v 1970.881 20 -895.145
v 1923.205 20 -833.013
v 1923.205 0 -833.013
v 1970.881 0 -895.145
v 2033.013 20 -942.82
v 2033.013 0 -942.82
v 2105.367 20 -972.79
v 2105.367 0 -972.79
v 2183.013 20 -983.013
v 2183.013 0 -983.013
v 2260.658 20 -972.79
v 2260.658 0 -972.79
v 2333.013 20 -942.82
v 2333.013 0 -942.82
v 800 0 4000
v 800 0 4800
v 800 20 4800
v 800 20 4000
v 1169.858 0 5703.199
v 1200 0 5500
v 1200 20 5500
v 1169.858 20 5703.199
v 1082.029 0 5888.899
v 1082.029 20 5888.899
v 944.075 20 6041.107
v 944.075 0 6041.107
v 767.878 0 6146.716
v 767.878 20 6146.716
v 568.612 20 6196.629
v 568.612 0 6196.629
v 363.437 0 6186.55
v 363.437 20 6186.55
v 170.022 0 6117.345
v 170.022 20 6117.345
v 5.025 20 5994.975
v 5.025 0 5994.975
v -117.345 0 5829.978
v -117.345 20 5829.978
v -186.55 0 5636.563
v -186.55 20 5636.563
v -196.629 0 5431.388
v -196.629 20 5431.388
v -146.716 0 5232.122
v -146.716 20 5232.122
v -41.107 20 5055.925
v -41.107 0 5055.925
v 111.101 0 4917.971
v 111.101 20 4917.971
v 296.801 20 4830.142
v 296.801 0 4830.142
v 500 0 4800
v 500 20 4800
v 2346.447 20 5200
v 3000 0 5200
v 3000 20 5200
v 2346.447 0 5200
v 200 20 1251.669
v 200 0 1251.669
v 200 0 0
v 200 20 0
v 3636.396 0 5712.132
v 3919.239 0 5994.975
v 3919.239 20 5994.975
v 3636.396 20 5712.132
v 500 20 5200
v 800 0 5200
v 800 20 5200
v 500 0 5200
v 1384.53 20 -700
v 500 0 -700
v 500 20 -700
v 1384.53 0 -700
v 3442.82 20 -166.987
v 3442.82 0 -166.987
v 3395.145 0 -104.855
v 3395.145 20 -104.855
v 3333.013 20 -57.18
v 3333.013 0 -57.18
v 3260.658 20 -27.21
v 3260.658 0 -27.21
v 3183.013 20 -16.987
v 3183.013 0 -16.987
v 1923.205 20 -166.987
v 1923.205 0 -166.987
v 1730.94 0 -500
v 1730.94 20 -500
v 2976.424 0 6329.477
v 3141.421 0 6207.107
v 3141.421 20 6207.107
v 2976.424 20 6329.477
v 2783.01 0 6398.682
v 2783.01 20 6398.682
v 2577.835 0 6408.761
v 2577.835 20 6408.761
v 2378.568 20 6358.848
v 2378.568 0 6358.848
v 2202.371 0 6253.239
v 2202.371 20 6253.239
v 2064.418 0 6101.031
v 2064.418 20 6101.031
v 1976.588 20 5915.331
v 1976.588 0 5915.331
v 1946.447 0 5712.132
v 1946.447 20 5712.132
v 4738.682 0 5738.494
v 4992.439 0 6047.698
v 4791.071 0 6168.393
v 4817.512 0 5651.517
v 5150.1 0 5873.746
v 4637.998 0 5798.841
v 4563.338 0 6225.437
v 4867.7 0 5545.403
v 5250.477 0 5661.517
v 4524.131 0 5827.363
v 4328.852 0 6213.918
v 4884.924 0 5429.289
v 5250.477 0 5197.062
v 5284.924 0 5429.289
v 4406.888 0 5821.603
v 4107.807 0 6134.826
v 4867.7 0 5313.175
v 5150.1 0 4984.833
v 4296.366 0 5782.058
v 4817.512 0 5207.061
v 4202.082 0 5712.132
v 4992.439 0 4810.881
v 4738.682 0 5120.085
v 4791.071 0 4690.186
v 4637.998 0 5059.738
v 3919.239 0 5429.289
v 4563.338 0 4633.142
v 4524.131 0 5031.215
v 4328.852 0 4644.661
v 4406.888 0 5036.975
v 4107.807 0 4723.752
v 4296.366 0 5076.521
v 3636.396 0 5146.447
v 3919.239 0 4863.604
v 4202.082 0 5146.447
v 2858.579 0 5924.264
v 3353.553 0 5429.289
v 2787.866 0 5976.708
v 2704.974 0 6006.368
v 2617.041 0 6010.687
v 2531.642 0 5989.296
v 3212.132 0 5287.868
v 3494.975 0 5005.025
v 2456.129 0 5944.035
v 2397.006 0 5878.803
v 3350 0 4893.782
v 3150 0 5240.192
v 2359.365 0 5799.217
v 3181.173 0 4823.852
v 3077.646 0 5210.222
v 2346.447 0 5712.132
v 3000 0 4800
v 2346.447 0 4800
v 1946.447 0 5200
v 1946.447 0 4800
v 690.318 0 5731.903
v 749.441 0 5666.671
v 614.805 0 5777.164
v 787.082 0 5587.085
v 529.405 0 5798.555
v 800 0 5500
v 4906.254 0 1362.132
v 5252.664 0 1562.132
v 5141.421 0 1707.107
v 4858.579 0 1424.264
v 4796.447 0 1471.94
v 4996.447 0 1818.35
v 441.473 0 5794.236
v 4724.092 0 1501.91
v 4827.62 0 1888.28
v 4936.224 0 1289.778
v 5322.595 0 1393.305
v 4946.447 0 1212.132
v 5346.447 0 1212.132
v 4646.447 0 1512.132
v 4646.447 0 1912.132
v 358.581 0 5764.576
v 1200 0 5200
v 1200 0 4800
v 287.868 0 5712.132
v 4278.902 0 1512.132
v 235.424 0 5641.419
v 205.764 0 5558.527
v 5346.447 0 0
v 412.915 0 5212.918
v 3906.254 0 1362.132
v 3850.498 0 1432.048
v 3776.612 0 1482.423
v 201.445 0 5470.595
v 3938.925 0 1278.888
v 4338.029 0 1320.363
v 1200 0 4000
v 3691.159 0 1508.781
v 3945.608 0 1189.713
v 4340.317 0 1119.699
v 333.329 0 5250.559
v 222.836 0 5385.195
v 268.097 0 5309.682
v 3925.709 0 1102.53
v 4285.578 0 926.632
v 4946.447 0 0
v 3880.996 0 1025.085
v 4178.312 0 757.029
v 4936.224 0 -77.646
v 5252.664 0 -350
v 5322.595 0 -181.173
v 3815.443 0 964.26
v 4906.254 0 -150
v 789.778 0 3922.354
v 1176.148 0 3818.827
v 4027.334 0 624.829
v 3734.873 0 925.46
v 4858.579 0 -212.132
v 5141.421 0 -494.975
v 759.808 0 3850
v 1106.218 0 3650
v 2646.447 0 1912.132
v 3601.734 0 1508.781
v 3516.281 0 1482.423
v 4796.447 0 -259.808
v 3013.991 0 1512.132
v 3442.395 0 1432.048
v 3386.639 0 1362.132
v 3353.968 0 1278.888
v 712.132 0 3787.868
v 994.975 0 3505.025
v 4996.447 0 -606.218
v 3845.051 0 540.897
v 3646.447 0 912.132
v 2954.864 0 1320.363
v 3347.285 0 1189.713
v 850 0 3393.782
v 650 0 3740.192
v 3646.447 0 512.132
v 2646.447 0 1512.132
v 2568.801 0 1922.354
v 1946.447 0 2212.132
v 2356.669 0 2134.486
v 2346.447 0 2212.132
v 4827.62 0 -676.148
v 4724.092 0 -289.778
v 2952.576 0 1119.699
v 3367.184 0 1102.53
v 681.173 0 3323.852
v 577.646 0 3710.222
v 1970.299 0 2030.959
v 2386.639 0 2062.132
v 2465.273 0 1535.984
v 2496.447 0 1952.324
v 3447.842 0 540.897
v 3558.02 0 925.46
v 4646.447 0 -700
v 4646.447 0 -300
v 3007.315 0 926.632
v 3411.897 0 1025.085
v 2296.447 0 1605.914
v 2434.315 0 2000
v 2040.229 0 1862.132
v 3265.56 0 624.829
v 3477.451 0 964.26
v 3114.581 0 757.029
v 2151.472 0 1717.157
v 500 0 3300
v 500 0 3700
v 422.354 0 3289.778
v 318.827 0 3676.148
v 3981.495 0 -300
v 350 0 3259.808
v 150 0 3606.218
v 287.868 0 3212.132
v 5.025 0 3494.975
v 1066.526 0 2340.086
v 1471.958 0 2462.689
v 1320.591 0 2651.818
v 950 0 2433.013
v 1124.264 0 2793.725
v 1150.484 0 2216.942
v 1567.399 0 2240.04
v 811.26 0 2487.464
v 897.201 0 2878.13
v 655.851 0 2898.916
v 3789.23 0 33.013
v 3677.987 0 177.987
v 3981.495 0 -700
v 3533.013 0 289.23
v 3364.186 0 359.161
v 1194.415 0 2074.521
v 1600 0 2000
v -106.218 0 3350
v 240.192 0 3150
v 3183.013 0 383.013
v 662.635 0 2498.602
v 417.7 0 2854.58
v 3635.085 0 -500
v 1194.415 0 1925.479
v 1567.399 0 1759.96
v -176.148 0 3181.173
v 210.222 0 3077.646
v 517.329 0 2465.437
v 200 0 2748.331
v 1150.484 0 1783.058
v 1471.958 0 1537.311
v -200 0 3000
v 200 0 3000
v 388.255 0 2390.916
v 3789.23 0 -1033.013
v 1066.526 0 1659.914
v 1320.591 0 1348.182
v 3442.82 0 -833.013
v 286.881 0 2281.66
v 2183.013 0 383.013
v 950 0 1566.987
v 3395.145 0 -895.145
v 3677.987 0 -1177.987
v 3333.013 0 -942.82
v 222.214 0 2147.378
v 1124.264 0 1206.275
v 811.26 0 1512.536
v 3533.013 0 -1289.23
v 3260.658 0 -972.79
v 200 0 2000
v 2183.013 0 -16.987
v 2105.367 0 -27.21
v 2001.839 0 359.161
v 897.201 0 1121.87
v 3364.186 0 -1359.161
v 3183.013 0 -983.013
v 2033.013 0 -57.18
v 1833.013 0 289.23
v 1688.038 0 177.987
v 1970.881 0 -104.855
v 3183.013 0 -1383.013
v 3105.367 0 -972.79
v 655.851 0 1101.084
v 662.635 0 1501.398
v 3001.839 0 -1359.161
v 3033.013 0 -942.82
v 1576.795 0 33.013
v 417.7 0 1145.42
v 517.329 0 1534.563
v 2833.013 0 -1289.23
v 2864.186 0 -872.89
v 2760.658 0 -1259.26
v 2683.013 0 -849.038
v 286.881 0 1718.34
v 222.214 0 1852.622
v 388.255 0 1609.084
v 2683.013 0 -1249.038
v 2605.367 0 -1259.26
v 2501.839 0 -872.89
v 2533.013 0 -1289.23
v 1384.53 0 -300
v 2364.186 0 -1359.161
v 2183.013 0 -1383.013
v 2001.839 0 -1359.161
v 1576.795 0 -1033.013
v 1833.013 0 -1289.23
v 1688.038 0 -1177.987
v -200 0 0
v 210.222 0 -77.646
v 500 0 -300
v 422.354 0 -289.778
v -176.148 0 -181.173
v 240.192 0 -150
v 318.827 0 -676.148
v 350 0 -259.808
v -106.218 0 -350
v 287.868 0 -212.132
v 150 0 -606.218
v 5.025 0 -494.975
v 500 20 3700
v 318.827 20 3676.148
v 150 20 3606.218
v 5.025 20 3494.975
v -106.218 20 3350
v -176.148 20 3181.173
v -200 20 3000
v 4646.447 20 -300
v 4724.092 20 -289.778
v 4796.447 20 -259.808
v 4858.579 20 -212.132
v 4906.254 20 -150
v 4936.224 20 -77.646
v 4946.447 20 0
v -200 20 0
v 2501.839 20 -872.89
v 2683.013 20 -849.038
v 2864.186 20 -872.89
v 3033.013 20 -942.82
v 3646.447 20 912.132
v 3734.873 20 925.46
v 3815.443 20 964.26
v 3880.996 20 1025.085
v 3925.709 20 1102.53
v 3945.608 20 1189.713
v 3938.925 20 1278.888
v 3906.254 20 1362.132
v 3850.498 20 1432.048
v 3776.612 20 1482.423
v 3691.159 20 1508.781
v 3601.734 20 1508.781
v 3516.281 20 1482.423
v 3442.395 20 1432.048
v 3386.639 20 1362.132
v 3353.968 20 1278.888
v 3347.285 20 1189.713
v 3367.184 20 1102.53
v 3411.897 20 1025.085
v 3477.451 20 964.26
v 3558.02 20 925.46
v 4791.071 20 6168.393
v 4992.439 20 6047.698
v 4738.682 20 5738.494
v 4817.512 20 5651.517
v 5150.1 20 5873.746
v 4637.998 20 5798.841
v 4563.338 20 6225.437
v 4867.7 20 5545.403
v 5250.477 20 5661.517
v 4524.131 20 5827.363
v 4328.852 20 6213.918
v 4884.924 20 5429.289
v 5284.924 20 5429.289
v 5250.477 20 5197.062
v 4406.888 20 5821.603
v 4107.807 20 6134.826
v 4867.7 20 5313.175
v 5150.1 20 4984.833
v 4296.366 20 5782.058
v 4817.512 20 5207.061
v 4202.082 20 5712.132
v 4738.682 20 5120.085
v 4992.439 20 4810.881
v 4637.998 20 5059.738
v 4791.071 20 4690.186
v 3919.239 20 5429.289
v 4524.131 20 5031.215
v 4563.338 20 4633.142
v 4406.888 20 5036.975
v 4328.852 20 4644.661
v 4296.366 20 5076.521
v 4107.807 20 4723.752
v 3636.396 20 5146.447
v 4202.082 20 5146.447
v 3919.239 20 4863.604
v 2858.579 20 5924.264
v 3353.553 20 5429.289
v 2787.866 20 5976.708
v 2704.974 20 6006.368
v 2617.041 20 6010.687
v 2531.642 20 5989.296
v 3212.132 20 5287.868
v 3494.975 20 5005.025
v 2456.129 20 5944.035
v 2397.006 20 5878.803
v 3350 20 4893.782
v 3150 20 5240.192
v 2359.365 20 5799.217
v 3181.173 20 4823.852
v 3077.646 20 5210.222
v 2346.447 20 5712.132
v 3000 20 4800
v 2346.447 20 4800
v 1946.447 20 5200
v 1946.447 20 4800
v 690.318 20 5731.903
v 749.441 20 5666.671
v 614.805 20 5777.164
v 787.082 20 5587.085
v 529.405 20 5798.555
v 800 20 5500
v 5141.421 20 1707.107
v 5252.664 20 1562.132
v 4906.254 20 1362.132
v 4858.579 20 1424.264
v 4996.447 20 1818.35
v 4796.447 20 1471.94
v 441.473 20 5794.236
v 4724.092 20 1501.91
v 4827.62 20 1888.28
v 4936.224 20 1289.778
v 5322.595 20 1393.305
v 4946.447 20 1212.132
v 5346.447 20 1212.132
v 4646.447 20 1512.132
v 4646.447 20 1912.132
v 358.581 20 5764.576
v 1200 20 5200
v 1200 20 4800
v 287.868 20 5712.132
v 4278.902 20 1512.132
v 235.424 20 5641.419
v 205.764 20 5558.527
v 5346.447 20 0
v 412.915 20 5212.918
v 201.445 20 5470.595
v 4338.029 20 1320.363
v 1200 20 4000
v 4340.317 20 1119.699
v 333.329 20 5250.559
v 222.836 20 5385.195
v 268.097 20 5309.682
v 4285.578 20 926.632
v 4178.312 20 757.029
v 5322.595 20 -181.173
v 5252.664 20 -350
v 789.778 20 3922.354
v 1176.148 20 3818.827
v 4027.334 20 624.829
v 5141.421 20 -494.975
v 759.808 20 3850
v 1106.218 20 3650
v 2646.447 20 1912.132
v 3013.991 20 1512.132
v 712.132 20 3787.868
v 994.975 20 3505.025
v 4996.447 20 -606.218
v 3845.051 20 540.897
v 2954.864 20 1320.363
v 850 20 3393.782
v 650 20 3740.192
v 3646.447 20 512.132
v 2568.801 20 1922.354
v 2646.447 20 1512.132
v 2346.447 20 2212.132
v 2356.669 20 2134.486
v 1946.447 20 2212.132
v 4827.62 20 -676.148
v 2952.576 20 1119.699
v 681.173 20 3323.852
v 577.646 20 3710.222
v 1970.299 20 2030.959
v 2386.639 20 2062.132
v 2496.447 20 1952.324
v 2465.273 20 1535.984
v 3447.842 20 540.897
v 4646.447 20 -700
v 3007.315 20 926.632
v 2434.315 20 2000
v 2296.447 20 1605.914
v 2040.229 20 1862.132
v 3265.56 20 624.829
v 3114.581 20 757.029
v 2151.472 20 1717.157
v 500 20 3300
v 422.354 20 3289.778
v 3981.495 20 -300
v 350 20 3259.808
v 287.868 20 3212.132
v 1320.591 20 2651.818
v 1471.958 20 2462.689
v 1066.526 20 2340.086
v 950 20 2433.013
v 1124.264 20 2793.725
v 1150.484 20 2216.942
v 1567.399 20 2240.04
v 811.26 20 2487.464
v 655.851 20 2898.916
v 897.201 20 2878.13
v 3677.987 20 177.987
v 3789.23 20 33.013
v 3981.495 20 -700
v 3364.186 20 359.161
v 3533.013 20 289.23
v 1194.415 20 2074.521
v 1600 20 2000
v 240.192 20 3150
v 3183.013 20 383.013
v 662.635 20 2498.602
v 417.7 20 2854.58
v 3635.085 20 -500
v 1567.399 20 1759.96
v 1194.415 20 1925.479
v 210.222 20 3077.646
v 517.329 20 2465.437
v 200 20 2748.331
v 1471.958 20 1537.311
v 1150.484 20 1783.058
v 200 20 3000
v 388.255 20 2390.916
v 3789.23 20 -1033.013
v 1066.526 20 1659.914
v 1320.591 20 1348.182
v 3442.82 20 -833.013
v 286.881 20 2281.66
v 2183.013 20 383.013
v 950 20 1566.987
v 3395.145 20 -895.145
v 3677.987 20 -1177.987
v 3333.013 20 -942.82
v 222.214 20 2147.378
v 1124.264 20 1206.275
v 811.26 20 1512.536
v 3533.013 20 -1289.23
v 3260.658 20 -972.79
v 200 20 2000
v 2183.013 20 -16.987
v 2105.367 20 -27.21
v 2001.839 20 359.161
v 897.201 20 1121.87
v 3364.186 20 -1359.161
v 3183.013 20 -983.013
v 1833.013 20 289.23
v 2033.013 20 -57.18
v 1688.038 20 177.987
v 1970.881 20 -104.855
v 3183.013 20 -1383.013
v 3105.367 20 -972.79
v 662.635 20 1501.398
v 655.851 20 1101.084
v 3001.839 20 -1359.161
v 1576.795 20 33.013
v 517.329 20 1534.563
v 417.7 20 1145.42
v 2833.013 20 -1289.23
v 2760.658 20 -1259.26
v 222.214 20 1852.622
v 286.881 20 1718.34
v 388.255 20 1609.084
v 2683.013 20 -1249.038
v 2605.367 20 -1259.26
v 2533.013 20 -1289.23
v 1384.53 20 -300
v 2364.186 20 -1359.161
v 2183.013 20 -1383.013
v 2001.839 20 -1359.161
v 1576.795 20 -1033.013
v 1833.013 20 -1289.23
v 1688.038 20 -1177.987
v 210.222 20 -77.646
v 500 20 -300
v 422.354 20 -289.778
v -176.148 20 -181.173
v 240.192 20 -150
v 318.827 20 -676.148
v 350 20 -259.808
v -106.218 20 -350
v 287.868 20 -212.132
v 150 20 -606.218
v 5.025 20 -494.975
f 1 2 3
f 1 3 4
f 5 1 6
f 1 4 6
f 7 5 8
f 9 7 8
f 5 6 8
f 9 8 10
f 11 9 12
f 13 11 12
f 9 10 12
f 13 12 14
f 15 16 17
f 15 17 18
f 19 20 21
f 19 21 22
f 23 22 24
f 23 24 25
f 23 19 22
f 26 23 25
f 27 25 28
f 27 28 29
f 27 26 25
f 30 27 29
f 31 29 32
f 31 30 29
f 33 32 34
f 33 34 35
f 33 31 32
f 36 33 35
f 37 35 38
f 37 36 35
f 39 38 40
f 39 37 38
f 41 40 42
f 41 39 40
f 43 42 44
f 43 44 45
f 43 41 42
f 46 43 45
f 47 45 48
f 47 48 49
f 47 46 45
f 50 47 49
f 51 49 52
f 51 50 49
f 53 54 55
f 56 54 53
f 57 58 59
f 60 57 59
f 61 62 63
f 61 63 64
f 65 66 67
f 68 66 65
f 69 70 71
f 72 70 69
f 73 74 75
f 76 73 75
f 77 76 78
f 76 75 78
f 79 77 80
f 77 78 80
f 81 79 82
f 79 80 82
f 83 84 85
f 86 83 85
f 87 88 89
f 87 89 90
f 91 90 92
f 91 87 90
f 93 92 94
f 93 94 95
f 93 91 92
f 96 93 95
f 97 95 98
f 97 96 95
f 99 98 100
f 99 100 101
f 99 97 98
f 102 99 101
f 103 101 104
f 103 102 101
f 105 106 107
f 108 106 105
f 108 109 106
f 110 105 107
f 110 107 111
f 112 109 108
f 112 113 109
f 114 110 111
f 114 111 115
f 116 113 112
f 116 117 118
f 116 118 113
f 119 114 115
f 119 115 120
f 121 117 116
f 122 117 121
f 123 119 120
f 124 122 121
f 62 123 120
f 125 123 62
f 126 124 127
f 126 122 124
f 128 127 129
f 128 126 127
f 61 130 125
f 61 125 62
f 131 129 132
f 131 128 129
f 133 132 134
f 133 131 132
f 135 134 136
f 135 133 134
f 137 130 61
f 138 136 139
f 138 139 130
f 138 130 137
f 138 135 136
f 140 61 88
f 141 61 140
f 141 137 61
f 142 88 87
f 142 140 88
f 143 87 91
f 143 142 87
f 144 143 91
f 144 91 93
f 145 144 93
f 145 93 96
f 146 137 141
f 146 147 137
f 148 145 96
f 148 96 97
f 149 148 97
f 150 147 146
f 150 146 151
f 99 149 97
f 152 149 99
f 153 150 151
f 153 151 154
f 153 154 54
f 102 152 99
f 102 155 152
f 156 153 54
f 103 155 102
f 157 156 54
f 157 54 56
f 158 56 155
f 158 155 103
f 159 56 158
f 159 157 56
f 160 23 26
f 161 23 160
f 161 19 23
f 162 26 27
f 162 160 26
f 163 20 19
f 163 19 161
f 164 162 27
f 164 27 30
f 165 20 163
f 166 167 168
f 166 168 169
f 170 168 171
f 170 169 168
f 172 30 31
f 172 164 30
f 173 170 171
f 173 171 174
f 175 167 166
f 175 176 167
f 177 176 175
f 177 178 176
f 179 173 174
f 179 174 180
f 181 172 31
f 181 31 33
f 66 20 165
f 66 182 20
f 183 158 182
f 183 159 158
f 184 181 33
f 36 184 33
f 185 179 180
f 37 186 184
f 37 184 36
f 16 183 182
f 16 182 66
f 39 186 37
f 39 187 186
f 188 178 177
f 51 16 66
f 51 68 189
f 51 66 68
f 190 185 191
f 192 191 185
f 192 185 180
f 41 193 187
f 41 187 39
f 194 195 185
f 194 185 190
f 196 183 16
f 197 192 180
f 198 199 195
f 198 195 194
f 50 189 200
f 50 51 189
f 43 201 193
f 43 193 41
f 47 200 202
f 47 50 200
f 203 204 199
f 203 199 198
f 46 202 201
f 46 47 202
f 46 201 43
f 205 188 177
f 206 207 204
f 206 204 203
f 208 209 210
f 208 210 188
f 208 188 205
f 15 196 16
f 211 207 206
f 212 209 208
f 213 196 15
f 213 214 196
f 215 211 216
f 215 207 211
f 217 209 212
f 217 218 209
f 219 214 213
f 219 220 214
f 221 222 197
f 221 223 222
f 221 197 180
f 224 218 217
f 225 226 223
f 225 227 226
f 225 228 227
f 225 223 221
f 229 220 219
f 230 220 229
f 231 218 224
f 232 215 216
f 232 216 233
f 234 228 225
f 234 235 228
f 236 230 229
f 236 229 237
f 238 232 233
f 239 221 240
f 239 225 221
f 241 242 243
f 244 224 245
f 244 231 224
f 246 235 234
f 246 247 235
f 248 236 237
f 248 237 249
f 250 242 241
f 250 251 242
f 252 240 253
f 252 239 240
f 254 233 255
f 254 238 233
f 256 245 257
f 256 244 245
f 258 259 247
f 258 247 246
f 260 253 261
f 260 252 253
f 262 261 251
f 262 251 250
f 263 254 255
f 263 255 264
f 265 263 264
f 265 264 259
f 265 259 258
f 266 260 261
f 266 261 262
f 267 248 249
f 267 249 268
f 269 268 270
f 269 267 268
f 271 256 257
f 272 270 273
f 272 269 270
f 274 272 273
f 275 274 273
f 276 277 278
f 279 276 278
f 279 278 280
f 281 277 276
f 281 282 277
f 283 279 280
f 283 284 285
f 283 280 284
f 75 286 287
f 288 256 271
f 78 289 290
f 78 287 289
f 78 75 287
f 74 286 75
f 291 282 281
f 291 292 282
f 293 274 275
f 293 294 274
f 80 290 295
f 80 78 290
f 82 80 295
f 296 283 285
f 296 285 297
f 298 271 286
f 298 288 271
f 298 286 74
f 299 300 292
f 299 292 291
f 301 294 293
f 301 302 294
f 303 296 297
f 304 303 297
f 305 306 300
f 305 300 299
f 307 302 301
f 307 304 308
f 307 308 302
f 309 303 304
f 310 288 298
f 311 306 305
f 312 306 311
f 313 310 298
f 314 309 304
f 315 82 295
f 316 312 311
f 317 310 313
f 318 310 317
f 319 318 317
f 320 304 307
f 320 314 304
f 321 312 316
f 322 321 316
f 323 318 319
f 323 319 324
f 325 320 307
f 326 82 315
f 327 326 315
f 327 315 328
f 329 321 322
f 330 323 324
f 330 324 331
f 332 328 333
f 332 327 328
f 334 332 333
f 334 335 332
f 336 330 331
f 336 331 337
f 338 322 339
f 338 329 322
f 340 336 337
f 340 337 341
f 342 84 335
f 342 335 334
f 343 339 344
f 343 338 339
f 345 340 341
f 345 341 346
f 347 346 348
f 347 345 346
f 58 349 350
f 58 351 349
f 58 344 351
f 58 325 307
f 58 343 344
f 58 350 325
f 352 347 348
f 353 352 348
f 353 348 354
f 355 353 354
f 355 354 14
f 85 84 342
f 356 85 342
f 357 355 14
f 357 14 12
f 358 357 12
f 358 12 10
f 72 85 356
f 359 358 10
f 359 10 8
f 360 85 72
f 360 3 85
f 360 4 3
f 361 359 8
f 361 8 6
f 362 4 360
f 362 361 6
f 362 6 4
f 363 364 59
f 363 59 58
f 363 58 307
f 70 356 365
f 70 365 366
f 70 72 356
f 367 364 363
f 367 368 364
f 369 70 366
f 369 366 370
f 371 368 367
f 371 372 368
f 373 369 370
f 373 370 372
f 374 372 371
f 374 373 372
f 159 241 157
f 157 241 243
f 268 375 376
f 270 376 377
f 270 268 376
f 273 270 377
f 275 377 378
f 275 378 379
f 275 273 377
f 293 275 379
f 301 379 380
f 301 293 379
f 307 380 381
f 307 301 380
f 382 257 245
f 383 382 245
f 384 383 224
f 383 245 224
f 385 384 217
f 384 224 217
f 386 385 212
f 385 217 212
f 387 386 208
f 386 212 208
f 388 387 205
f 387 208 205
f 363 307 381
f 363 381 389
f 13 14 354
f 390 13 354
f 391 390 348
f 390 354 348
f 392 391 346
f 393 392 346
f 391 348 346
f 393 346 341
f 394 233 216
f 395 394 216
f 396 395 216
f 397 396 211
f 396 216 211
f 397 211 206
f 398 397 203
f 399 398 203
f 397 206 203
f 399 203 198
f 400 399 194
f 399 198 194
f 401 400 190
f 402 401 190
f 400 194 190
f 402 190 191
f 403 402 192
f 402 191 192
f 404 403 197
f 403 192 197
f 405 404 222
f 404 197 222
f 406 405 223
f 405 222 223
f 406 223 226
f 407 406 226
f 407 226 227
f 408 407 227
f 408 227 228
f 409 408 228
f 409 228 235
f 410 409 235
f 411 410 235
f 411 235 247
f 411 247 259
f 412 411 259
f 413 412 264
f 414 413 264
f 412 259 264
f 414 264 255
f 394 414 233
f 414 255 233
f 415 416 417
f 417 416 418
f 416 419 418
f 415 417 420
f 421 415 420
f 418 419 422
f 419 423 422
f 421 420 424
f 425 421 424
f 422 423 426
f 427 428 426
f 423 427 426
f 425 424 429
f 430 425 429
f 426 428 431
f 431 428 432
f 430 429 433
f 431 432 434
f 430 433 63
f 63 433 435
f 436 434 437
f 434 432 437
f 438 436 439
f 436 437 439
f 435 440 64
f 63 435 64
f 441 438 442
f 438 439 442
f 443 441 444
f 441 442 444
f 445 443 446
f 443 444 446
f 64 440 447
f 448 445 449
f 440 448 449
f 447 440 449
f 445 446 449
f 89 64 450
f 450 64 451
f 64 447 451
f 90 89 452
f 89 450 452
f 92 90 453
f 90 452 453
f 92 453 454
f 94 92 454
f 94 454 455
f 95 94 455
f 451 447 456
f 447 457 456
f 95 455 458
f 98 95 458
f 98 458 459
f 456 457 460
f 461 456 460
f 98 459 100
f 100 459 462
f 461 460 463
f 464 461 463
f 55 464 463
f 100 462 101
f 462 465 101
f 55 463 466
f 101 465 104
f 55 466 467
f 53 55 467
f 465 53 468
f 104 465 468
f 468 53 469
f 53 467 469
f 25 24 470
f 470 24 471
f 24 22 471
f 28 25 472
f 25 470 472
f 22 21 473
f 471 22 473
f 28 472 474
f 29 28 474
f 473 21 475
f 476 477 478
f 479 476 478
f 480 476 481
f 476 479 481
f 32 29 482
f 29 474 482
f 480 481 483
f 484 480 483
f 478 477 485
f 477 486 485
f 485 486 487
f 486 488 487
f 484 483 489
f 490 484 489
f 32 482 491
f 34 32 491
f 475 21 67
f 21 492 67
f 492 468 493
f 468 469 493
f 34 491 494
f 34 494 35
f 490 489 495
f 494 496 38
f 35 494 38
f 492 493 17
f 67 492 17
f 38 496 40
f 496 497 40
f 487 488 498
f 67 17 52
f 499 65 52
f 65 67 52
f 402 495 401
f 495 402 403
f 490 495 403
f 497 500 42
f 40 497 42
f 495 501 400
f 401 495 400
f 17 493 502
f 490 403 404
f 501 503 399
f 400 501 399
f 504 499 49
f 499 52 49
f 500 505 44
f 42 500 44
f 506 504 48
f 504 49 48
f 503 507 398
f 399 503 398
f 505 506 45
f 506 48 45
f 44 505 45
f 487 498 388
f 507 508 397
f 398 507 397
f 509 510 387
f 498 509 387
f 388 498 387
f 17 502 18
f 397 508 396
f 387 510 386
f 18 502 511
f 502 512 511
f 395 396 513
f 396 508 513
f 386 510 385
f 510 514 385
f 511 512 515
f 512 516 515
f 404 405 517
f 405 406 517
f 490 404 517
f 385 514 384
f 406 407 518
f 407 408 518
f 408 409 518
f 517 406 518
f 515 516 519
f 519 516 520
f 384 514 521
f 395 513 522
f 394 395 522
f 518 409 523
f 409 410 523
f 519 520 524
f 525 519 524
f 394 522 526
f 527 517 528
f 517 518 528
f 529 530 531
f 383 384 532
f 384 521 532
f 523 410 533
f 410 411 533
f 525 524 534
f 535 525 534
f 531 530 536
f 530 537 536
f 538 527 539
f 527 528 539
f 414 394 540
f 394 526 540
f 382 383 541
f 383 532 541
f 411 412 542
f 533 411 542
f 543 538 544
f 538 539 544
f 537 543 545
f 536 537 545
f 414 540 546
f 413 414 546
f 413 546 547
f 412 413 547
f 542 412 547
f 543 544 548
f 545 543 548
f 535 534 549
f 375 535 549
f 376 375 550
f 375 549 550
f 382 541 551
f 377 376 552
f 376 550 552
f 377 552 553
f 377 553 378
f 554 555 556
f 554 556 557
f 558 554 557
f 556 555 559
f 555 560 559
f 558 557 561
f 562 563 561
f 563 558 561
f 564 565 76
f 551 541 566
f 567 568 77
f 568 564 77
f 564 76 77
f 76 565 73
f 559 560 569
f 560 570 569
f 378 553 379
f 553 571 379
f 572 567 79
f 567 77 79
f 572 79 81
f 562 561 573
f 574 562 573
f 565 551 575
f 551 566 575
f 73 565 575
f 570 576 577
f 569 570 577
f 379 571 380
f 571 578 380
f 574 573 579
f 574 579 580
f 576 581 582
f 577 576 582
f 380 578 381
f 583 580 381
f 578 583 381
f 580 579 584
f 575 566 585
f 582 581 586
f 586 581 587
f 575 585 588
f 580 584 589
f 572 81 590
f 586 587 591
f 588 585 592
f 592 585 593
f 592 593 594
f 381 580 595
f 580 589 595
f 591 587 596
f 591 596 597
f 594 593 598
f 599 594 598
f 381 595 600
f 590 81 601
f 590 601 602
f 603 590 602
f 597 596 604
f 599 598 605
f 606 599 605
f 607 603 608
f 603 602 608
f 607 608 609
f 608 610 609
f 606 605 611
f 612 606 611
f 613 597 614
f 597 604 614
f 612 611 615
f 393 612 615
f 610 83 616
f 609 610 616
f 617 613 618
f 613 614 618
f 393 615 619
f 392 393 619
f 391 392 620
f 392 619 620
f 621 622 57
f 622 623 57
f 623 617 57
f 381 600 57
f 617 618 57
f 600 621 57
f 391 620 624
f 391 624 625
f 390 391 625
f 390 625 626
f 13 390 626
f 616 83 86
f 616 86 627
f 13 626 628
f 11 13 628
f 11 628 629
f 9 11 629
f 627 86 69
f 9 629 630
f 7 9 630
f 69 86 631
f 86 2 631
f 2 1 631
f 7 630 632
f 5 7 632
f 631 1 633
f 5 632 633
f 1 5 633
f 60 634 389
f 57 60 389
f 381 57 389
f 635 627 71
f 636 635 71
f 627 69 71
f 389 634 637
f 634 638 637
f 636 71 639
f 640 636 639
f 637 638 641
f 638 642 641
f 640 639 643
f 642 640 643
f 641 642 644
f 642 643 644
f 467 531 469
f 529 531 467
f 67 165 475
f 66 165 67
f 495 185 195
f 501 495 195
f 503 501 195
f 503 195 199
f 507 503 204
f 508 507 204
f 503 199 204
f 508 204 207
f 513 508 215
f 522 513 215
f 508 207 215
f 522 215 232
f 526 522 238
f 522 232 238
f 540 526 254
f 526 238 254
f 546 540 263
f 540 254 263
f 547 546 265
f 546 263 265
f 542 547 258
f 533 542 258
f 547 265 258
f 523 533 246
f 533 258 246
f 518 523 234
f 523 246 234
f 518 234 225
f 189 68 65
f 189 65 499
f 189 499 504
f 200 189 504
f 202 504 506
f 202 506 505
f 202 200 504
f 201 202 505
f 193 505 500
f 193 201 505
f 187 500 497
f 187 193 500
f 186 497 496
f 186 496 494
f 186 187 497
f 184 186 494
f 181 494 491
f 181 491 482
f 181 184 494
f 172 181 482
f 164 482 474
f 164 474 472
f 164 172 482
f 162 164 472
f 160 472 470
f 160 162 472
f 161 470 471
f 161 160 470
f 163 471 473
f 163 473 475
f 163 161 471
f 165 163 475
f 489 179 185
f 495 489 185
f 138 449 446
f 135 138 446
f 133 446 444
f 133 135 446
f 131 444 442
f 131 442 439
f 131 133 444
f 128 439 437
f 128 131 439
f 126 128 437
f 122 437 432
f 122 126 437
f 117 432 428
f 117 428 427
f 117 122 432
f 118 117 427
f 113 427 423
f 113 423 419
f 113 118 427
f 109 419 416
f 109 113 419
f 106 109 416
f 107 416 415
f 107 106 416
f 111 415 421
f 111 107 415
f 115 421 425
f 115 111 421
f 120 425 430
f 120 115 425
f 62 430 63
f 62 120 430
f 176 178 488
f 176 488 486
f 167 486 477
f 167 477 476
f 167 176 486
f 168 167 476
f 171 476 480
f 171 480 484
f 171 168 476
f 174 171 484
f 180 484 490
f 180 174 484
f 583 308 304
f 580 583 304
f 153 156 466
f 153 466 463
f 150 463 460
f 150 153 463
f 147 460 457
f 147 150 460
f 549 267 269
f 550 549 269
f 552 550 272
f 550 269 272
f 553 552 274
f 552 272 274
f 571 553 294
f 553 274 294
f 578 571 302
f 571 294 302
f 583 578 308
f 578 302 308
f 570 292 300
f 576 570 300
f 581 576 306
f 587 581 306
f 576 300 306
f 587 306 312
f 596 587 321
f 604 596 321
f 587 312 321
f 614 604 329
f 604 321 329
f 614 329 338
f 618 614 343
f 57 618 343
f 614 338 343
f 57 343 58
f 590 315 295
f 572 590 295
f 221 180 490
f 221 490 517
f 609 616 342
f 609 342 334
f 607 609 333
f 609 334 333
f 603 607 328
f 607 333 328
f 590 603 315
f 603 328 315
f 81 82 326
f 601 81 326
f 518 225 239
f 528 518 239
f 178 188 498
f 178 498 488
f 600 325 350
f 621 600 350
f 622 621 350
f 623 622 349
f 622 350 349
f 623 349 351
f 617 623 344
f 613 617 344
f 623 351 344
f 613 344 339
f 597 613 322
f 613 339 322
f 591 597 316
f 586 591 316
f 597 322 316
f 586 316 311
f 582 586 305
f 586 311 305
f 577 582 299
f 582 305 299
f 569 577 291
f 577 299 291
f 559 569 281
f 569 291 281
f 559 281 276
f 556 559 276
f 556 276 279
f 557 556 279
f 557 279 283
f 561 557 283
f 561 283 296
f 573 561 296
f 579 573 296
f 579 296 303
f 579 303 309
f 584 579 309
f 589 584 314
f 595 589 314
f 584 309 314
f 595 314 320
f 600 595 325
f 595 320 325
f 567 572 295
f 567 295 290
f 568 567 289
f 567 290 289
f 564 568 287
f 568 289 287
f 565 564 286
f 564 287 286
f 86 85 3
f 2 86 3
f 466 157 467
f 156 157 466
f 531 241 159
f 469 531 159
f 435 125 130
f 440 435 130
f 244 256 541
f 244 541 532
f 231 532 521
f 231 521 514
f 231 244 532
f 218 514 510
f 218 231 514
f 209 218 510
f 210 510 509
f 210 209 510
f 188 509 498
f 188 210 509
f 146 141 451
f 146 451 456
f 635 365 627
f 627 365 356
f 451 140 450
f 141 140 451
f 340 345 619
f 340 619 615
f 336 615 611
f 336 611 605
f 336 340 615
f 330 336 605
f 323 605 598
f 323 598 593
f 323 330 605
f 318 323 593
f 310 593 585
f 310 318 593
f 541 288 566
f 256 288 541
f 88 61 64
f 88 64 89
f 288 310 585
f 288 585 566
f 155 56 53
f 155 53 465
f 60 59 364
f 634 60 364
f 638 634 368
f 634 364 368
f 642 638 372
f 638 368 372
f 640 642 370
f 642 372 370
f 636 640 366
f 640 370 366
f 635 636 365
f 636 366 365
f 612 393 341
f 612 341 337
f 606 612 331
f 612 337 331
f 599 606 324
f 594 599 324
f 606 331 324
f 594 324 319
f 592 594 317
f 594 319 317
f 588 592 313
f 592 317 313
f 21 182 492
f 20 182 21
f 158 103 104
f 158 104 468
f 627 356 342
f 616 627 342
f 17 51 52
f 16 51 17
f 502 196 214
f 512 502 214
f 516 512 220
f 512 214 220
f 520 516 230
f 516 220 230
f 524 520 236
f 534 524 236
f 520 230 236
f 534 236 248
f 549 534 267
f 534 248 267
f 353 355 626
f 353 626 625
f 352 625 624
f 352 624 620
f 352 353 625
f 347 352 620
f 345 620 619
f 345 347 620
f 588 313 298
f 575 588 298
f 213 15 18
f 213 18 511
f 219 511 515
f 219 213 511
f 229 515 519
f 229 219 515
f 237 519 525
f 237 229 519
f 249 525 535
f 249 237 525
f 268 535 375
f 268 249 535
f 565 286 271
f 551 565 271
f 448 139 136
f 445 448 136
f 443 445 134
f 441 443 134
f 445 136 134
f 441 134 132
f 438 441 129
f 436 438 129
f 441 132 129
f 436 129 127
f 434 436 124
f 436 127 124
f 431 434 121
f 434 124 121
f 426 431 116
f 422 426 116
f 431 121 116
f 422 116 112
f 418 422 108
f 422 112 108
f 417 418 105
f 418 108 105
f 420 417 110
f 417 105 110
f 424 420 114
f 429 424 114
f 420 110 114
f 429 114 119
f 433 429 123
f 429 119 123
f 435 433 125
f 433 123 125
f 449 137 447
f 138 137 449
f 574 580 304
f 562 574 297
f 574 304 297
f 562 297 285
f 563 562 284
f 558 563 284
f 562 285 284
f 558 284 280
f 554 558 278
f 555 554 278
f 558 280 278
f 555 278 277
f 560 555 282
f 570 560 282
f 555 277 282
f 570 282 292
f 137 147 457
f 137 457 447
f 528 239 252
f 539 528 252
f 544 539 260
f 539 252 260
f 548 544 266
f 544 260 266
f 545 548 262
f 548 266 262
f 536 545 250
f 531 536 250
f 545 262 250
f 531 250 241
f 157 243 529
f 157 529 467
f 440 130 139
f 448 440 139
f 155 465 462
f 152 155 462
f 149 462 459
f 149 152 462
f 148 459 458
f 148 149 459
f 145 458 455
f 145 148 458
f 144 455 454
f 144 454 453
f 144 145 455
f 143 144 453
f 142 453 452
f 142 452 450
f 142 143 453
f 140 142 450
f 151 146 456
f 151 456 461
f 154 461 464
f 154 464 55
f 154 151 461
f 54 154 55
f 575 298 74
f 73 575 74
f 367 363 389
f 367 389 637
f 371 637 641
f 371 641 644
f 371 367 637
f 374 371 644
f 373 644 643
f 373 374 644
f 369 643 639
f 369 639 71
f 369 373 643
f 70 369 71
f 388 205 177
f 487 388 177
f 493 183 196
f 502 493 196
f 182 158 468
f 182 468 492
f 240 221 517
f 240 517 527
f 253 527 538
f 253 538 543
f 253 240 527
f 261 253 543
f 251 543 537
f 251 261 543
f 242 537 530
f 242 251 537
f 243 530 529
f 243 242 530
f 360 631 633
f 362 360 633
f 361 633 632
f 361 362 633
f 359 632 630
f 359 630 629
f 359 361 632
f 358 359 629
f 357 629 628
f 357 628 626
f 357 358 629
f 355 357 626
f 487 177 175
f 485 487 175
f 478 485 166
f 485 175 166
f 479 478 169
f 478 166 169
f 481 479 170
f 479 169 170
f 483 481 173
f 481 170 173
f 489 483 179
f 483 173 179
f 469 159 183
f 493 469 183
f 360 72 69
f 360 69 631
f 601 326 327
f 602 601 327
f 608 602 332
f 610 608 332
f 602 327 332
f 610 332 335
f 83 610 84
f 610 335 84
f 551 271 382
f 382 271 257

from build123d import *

# Parameters (mm, degrees)
EXTRUDE_1_DEPTH = 20


with BuildPart() as part:
    # 草图1 → 凸台-拉伸1 (new body)
    with BuildSketch(Plane(origin=(0, 0, 0), x_dir=(1, 0, 0), z_dir=(0, 1, 0))):
        with BuildLine():
            Line((500, 700), (1384.529946162, 700))
            Line((1384.529946162, 700), (1576.794919243, 1033.012701892))
            ThreePointArc((1576.794919243, 1033.012701892), (2001.83937032, 1359.160780295), (2533.012701892, 1289.230484541))
            ThreePointArc((2533.012701892, 1289.230484541), (2683.012701892, 1249.038105677), (2833.012701892, 1289.230484541))
            ThreePointArc((2833.012701892, 1289.230484541), (3364.186033464, 1359.160780295), (3789.230484541, 1033.012701892))
            Line((3789.230484541, 1033.012701892), (3981.495457623, 700))
            Line((3981.495457623, 700), (4646.446609407, 700))
            ThreePointArc((4646.446609407, 700), (5141.421356237, 494.974746831), (5346.446609407, 0))
            Line((5346.446609407, 0), (5346.446609407, -1212.132034356))
            ThreePointArc((5346.446609407, -1212.132034356), (5141.421356237, -1707.106781187), (4646.446609407, -1912.132034356))
            Line((4646.446609407, -1912.132034356), (3646.446609407, -1912.132034356))
            Line((3646.446609407, -1912.132034356), (2646.446609407, -1912.132034356))
            ThreePointArc((2646.446609407, -1912.132034356), (2434.314575051, -2000), (2346.446609407, -2212.132034356))
            Line((2346.446609407, -2212.132034356), (2346.446609407, -4800))
            Line((2346.446609407, -4800), (3000, -4800))
            ThreePointArc((3000, -4800), (3267.878402656, -4853.284327242), (3494.974746831, -5005.025253169))
            Line((3494.974746831, -5005.025253169), (3636.396103068, -5146.446609407))
            Line((3636.396103068, -5146.446609407), (3919.238815543, -4863.603896932))
            ThreePointArc((3919.238815543, -4863.603896932), (5284.924240492, -5429.289321881), (3919.238815543, -5994.974746831))
            Line((3919.238815543, -5994.974746831), (3636.396103068, -5712.132034356))
            Line((3636.396103068, -5712.132034356), (3141.421356237, -6207.106781187))
            ThreePointArc((3141.421356237, -6207.106781187), (2378.568206751, -6358.847707114), (1946.446609407, -5712.132034356))
            Line((1946.446609407, -5712.132034356), (1946.446609407, -5200))
            Line((1946.446609407, -5200), (1200, -5200))
            Line((1200, -5200), (1200, -5500))
            ThreePointArc((1200, -5500), (5.025253169, -5994.974746831), (500, -4800))
            Line((500, -4800), (800, -4800))
            Line((800, -4800), (800, -4000))
            ThreePointArc((800, -4000), (712.132034356, -3787.867965644), (500, -3700))
            ThreePointArc((500, -3700), (5.025253169, -3494.974746831), (-200, -3000))
            Line((-200, -3000), (-200, -2000))
            Line((-200, -2000), (-200, 0))
            ThreePointArc((-200, 0), (5.025253169, 494.974746831), (500, 700))
        make_face()
        with BuildLine():
            Line((1730.940107676, 500), (1923.205080757, 833.012701892))
            ThreePointArc((1923.205080757, 833.012701892), (2105.366988361, 972.790449779), (2333.012701892, 942.820323028))
            ThreePointArc((2333.012701892, 942.820323028), (2683.012701892, 849.038105677), (3033.012701892, 942.820323028))
            ThreePointArc((3033.012701892, 942.820323028), (3260.658415423, 972.790449779), (3442.820323028, 833.012701892))
            Line((3442.820323028, 833.012701892), (3635.085296109, 500))
            Line((3635.085296109, 500), (3442.820323028, 166.987298108))
            ThreePointArc((3442.820323028, 166.987298108), (3333.012701893, 57.179676972), (3183.012701893, 16.987298108))
            Line((3183.012701893, 16.987298108), (2183.012701892, 16.987298108))
            ThreePointArc((2183.012701892, 16.987298108), (2033.012701892, 57.179676972), (1923.205080757, 166.987298108))
            Line((1923.205080757, 166.987298108), (1730.940107676, 500))
        make_face(mode=Mode.SUBTRACT)
        with BuildLine():
            Line((1384.529946162, 300), (1576.794919243, -33.012701892))
            ThreePointArc((1576.794919243, -33.012701892), (1833.012701892, -289.230484541), (2183.012701892, -383.012701892))
            Line((2183.012701892, -383.012701892), (3183.012701893, -383.012701892))
            ThreePointArc((3183.012701893, -383.012701892), (3533.012701893, -289.230484541), (3789.230484542, -33.012701892))
            Line((3789.230484542, -33.012701892), (3981.495457623, 300))
            Line((3981.495457623, 300), (4646.446609407, 300))
            ThreePointArc((4646.446609407, 300), (4858.578643763, 212.132034356), (4946.446609407, 0))
            Line((4946.446609407, 0), (4946.446609407, -1212.132034356))
            ThreePointArc((4946.446609407, -1212.132034356), (4858.578643763, -1424.264068712), (4646.446609407, -1512.132034356))
            Line((4646.446609407, -1512.132034356), (4278.90214144, -1512.132034356))
            ThreePointArc((4278.90214144, -1512.132034356), (4238.054587717, -837.966295679), (3646.446609407, -512.132034356))
            ThreePointArc((3646.446609407, -512.132034356), (3054.838631097, -837.966295679), (3013.991077373, -1512.132034356))
            Line((3013.991077373, -1512.132034356), (2646.446609407, -1512.132034356))
            ThreePointArc((2646.446609407, -1512.132034356), (2151.471862576, -1717.157287525), (1946.446609407, -2212.132034356))
            Line((1946.446609407, -2212.132034356), (1946.446609407, -4800))
            Line((1946.446609407, -4800), (1200, -4800))
            Line((1200, -4800), (1200, -4000))
            ThreePointArc((1200, -4000), (994.974746831, -3505.025253169), (500, -3300))
            ThreePointArc((500, -3300), (287.867965644, -3212.132034356), (200, -3000))
            Line((200, -3000), (200, -2748.331477355))
            ThreePointArc((200, -2748.331477355), (1124.264068712, -2793.725393319), (1600, -2000))
            ThreePointArc((1600, -2000), (1124.264068712, -1206.274606681), (200, -1251.668522645))
            Line((200, -1251.668522645), (200, 0))
            ThreePointArc((200, 0), (287.867965644, 212.132034356), (500, 300))
            Line((500, 300), (1384.529946162, 300))
        make_face(mode=Mode.SUBTRACT)
        with BuildLine():
            Line((2858.578643763, -5924.264068712), (3353.553390593, -5429.289321881))
            Line((3353.553390593, -5429.289321881), (3212.132034356, -5287.867965644))
            ThreePointArc((3212.132034356, -5287.867965644), (3114.80502971, -5222.836140247), (3000, -5200))
            Line((3000, -5200), (2346.446609407, -5200))
            Line((2346.446609407, -5200), (2346.446609407, -5712.132034356))
            ThreePointArc((2346.446609407, -5712.132034356), (2531.641579697, -5989.295894109), (2858.578643763, -5924.264068712))
        make_face(mode=Mode.SUBTRACT)
        with BuildLine():
            Line((4202.081528017, -5712.132034356), (3919.238815543, -5429.289321881))
            Line((3919.238815543, -5429.289321881), (4202.081528017, -5146.446609407))
            ThreePointArc((4202.081528017, -5146.446609407), (4884.924240492, -5429.289321881), (4202.081528017, -5712.132034356))
        make_face(mode=Mode.SUBTRACT)
        with BuildLine():
            Line((800, -5500), (800, -5200))
            Line((800, -5200), (500, -5200))
            ThreePointArc((500, -5200), (287.867965644, -5712.132034356), (800, -5500))
        make_face(mode=Mode.SUBTRACT)
        with BuildLine():
            ThreePointArc((3646.446609407, -1512.132034356), (3346.446609407, -1212.132034356), (3646.446609407, -912.132034356))
            ThreePointArc((3646.446609407, -912.132034356), (3946.446609407, -1212.132034356), (3646.446609407, -1512.132034356))
        make_face(mode=Mode.SUBTRACT)
        with BuildLine():
            ThreePointArc((1200, -2000), (700, -2500), (200, -2000))
            ThreePointArc((200, -2000), (700, -1500), (1200, -2000))
        make_face(mode=Mode.SUBTRACT)
    extrude(amount=EXTRUDE_1_DEPTH)


solid = part.part
